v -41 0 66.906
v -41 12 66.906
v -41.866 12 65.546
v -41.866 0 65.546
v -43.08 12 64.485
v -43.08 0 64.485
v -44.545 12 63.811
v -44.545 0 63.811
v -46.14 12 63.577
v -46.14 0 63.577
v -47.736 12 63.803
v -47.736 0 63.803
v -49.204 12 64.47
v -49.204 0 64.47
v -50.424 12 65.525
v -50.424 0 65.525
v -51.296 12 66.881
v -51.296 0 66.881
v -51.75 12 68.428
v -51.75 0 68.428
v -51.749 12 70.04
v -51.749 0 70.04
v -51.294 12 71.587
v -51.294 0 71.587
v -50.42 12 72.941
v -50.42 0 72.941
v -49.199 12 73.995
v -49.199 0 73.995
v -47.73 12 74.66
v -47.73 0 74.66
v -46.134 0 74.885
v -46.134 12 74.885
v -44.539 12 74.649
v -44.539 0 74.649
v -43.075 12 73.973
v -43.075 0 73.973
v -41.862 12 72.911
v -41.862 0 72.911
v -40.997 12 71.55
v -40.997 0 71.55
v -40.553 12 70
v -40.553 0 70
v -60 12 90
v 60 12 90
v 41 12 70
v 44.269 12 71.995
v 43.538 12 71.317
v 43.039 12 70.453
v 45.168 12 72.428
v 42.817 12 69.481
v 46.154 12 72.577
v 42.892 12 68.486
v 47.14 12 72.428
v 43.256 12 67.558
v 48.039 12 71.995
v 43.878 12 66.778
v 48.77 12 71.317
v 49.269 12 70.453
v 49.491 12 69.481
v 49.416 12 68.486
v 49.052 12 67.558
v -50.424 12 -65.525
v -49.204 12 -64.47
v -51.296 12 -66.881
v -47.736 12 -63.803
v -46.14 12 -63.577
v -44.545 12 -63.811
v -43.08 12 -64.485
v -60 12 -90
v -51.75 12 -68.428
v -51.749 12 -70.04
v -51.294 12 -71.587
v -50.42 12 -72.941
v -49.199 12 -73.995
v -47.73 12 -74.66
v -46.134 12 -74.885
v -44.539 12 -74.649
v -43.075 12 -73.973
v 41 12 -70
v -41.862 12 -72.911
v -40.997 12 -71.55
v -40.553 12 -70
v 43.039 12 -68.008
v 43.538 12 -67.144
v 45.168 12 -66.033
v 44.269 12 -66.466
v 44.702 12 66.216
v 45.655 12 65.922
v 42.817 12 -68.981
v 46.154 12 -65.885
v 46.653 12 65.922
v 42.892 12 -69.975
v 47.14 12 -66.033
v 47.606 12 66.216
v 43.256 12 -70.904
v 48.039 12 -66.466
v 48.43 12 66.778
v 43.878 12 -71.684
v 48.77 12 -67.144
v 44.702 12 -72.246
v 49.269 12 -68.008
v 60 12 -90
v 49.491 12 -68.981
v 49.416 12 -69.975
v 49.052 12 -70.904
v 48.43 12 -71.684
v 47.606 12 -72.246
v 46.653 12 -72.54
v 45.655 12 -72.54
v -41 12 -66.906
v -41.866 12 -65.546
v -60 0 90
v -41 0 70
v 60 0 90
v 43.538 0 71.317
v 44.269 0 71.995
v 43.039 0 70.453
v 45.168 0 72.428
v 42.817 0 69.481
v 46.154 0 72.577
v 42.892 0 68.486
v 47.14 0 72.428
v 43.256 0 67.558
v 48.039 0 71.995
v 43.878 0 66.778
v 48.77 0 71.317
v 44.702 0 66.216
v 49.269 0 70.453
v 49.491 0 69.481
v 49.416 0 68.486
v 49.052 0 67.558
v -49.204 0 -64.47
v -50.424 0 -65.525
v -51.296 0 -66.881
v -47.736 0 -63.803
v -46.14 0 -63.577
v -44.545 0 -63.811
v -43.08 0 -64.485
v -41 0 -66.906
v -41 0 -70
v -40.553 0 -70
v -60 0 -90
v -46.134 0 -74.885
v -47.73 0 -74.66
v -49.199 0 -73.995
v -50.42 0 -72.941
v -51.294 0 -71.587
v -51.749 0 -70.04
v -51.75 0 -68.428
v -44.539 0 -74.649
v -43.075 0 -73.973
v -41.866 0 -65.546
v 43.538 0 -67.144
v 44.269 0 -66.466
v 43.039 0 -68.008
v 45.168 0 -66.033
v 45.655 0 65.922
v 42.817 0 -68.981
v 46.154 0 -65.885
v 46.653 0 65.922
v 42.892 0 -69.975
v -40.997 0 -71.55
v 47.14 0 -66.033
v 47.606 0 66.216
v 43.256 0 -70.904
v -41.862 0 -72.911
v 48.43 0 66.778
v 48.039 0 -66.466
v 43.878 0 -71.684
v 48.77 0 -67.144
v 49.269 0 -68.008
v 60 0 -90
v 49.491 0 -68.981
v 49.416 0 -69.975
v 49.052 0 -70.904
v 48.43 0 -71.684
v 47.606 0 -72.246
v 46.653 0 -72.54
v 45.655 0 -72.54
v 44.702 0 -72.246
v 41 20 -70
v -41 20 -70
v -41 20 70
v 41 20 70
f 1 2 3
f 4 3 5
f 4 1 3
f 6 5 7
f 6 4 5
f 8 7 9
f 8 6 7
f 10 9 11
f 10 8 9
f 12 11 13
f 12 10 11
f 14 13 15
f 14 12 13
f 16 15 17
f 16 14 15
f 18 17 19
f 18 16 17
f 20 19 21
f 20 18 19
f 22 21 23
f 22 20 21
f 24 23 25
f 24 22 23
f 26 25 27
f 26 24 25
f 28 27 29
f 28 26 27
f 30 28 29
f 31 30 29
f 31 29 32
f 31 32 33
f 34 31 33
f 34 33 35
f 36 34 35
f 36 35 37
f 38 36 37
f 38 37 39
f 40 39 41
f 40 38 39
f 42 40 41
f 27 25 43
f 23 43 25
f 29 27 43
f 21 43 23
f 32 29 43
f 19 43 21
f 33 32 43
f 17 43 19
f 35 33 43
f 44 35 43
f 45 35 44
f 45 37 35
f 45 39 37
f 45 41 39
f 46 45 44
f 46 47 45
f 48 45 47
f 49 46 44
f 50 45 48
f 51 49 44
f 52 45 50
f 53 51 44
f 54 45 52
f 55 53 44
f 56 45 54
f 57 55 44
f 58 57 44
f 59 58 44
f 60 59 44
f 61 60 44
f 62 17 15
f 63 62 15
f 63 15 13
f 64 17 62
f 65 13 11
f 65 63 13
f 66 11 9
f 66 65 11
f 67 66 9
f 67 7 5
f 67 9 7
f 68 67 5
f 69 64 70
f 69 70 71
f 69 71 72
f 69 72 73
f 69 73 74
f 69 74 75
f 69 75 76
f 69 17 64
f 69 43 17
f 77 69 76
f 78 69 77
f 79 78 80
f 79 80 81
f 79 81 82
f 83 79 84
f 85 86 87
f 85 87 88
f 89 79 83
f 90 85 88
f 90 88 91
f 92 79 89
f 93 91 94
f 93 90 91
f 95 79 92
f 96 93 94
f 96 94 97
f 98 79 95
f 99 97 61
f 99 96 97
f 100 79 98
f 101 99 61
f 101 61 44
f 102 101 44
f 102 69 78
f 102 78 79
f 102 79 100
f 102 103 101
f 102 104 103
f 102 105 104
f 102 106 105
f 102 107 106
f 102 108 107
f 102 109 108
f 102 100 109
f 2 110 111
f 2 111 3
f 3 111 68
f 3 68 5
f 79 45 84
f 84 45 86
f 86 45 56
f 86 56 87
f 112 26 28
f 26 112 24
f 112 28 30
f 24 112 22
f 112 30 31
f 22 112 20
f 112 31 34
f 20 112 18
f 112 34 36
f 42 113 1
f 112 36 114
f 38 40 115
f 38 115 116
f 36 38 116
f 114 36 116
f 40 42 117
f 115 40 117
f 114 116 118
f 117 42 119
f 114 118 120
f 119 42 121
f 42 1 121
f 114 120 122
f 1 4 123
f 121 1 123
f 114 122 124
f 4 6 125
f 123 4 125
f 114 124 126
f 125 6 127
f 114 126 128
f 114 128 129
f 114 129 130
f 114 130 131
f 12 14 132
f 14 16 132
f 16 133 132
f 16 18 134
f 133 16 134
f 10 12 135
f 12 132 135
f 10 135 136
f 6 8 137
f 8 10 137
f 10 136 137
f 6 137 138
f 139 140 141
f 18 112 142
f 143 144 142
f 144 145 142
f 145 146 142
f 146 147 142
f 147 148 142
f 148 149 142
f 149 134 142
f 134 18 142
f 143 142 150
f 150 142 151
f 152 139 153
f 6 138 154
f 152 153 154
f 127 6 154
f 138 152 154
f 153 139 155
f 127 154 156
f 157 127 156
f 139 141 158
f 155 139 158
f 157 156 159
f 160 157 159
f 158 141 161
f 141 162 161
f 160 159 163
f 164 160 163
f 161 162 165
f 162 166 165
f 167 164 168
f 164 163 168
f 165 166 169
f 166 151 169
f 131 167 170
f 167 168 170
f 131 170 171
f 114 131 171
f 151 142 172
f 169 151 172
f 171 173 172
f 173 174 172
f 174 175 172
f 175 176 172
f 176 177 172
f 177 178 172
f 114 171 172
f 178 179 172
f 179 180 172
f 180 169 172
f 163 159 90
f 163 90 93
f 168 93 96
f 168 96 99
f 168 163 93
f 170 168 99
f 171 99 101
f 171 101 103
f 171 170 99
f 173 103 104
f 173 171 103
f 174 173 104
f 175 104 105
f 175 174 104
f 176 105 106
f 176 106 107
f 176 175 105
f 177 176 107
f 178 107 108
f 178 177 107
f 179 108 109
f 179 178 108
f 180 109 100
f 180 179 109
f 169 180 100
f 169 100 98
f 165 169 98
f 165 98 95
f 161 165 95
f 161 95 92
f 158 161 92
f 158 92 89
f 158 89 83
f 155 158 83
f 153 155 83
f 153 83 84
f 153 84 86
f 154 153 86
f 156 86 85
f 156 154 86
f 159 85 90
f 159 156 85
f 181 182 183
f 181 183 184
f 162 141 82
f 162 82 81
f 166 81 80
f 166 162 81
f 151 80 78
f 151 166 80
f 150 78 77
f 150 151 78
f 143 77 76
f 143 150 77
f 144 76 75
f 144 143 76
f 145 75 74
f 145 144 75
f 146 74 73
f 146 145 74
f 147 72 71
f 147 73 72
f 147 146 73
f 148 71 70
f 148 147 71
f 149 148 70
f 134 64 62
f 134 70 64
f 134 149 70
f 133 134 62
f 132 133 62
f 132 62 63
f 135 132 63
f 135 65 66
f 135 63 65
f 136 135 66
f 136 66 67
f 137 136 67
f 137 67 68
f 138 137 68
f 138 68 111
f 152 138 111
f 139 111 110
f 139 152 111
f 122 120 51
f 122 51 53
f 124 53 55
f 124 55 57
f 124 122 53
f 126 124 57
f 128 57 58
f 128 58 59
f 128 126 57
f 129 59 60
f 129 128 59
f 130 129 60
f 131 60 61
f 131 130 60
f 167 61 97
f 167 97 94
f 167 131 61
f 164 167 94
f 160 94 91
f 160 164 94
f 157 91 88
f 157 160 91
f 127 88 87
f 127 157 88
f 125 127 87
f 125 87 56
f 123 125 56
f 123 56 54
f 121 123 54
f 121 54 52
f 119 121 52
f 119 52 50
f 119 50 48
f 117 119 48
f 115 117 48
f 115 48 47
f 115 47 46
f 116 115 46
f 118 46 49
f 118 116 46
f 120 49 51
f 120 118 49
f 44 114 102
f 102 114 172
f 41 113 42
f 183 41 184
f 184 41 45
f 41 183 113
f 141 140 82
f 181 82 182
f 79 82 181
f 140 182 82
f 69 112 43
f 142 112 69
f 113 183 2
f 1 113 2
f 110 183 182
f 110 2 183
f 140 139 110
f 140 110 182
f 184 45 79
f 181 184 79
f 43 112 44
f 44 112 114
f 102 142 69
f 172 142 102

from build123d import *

# Parameters (mm, degrees)
F_01_BASE_PROFILE_W           = 120
F_01_BASE_PROFILE_H           = 180
F_01_BASE_PROFILE_R           = 5.653846154
F_01_BASE_PROFILE_R_2         = 3.346153846
F_01_BASE_PROFILE_W_2         = 18
F_01_BASE_PROFILE_H_2         = 125
F_01_BASE_EXTRUDE_DEPTH       = 12
F_02_BOSS_PROFILE_W           = 82
F_02_BOSS_PROFILE_H           = 140
F_02_REINFORCEMENT_BOSS_DEPTH = 20


with BuildPart() as part:
    # 01_Base_Profile → 01_Base_Extrude (new body)
    with BuildSketch(Plane(origin=(0, 0, 0), x_dir=(1, 0, 0), z_dir=(0, 1, 0))):
        Rectangle(F_01_BASE_PROFILE_W, F_01_BASE_PROFILE_H)
        with Locations(Location((-46.153846154, -69.230769231, 0), (0, 0, 270))):
            Circle(F_01_BASE_PROFILE_R, mode=Mode.SUBTRACT)
        with Locations(Location((46.153846154, -69.230769231, 0), (0, 0, 270))):
            Circle(F_01_BASE_PROFILE_R_2, mode=Mode.SUBTRACT)
        with Locations(Location((-46.153846154, 69.230769231, 0), (0, 0, 270))):
            Circle(F_01_BASE_PROFILE_R, mode=Mode.SUBTRACT)
        with Locations(Location((46.153846154, 69.230769231, 0), (0, 0, 270))):
            Circle(F_01_BASE_PROFILE_R_2, mode=Mode.SUBTRACT)
        Rectangle(F_01_BASE_PROFILE_W_2, F_01_BASE_PROFILE_H_2, mode=Mode.SUBTRACT)
    extrude(amount=F_01_BASE_EXTRUDE_DEPTH)

    # 02_Boss_Profile → 02_Reinforcement_Boss (add)
    with BuildSketch(Plane(origin=(0, 0, 0), x_dir=(1, 0, 0), z_dir=(0, 1, 0))):
        Rectangle(F_02_BOSS_PROFILE_W, F_02_BOSS_PROFILE_H)
    extrude(amount=F_02_REINFORCEMENT_BOSS_DEPTH)


solid = part.part
